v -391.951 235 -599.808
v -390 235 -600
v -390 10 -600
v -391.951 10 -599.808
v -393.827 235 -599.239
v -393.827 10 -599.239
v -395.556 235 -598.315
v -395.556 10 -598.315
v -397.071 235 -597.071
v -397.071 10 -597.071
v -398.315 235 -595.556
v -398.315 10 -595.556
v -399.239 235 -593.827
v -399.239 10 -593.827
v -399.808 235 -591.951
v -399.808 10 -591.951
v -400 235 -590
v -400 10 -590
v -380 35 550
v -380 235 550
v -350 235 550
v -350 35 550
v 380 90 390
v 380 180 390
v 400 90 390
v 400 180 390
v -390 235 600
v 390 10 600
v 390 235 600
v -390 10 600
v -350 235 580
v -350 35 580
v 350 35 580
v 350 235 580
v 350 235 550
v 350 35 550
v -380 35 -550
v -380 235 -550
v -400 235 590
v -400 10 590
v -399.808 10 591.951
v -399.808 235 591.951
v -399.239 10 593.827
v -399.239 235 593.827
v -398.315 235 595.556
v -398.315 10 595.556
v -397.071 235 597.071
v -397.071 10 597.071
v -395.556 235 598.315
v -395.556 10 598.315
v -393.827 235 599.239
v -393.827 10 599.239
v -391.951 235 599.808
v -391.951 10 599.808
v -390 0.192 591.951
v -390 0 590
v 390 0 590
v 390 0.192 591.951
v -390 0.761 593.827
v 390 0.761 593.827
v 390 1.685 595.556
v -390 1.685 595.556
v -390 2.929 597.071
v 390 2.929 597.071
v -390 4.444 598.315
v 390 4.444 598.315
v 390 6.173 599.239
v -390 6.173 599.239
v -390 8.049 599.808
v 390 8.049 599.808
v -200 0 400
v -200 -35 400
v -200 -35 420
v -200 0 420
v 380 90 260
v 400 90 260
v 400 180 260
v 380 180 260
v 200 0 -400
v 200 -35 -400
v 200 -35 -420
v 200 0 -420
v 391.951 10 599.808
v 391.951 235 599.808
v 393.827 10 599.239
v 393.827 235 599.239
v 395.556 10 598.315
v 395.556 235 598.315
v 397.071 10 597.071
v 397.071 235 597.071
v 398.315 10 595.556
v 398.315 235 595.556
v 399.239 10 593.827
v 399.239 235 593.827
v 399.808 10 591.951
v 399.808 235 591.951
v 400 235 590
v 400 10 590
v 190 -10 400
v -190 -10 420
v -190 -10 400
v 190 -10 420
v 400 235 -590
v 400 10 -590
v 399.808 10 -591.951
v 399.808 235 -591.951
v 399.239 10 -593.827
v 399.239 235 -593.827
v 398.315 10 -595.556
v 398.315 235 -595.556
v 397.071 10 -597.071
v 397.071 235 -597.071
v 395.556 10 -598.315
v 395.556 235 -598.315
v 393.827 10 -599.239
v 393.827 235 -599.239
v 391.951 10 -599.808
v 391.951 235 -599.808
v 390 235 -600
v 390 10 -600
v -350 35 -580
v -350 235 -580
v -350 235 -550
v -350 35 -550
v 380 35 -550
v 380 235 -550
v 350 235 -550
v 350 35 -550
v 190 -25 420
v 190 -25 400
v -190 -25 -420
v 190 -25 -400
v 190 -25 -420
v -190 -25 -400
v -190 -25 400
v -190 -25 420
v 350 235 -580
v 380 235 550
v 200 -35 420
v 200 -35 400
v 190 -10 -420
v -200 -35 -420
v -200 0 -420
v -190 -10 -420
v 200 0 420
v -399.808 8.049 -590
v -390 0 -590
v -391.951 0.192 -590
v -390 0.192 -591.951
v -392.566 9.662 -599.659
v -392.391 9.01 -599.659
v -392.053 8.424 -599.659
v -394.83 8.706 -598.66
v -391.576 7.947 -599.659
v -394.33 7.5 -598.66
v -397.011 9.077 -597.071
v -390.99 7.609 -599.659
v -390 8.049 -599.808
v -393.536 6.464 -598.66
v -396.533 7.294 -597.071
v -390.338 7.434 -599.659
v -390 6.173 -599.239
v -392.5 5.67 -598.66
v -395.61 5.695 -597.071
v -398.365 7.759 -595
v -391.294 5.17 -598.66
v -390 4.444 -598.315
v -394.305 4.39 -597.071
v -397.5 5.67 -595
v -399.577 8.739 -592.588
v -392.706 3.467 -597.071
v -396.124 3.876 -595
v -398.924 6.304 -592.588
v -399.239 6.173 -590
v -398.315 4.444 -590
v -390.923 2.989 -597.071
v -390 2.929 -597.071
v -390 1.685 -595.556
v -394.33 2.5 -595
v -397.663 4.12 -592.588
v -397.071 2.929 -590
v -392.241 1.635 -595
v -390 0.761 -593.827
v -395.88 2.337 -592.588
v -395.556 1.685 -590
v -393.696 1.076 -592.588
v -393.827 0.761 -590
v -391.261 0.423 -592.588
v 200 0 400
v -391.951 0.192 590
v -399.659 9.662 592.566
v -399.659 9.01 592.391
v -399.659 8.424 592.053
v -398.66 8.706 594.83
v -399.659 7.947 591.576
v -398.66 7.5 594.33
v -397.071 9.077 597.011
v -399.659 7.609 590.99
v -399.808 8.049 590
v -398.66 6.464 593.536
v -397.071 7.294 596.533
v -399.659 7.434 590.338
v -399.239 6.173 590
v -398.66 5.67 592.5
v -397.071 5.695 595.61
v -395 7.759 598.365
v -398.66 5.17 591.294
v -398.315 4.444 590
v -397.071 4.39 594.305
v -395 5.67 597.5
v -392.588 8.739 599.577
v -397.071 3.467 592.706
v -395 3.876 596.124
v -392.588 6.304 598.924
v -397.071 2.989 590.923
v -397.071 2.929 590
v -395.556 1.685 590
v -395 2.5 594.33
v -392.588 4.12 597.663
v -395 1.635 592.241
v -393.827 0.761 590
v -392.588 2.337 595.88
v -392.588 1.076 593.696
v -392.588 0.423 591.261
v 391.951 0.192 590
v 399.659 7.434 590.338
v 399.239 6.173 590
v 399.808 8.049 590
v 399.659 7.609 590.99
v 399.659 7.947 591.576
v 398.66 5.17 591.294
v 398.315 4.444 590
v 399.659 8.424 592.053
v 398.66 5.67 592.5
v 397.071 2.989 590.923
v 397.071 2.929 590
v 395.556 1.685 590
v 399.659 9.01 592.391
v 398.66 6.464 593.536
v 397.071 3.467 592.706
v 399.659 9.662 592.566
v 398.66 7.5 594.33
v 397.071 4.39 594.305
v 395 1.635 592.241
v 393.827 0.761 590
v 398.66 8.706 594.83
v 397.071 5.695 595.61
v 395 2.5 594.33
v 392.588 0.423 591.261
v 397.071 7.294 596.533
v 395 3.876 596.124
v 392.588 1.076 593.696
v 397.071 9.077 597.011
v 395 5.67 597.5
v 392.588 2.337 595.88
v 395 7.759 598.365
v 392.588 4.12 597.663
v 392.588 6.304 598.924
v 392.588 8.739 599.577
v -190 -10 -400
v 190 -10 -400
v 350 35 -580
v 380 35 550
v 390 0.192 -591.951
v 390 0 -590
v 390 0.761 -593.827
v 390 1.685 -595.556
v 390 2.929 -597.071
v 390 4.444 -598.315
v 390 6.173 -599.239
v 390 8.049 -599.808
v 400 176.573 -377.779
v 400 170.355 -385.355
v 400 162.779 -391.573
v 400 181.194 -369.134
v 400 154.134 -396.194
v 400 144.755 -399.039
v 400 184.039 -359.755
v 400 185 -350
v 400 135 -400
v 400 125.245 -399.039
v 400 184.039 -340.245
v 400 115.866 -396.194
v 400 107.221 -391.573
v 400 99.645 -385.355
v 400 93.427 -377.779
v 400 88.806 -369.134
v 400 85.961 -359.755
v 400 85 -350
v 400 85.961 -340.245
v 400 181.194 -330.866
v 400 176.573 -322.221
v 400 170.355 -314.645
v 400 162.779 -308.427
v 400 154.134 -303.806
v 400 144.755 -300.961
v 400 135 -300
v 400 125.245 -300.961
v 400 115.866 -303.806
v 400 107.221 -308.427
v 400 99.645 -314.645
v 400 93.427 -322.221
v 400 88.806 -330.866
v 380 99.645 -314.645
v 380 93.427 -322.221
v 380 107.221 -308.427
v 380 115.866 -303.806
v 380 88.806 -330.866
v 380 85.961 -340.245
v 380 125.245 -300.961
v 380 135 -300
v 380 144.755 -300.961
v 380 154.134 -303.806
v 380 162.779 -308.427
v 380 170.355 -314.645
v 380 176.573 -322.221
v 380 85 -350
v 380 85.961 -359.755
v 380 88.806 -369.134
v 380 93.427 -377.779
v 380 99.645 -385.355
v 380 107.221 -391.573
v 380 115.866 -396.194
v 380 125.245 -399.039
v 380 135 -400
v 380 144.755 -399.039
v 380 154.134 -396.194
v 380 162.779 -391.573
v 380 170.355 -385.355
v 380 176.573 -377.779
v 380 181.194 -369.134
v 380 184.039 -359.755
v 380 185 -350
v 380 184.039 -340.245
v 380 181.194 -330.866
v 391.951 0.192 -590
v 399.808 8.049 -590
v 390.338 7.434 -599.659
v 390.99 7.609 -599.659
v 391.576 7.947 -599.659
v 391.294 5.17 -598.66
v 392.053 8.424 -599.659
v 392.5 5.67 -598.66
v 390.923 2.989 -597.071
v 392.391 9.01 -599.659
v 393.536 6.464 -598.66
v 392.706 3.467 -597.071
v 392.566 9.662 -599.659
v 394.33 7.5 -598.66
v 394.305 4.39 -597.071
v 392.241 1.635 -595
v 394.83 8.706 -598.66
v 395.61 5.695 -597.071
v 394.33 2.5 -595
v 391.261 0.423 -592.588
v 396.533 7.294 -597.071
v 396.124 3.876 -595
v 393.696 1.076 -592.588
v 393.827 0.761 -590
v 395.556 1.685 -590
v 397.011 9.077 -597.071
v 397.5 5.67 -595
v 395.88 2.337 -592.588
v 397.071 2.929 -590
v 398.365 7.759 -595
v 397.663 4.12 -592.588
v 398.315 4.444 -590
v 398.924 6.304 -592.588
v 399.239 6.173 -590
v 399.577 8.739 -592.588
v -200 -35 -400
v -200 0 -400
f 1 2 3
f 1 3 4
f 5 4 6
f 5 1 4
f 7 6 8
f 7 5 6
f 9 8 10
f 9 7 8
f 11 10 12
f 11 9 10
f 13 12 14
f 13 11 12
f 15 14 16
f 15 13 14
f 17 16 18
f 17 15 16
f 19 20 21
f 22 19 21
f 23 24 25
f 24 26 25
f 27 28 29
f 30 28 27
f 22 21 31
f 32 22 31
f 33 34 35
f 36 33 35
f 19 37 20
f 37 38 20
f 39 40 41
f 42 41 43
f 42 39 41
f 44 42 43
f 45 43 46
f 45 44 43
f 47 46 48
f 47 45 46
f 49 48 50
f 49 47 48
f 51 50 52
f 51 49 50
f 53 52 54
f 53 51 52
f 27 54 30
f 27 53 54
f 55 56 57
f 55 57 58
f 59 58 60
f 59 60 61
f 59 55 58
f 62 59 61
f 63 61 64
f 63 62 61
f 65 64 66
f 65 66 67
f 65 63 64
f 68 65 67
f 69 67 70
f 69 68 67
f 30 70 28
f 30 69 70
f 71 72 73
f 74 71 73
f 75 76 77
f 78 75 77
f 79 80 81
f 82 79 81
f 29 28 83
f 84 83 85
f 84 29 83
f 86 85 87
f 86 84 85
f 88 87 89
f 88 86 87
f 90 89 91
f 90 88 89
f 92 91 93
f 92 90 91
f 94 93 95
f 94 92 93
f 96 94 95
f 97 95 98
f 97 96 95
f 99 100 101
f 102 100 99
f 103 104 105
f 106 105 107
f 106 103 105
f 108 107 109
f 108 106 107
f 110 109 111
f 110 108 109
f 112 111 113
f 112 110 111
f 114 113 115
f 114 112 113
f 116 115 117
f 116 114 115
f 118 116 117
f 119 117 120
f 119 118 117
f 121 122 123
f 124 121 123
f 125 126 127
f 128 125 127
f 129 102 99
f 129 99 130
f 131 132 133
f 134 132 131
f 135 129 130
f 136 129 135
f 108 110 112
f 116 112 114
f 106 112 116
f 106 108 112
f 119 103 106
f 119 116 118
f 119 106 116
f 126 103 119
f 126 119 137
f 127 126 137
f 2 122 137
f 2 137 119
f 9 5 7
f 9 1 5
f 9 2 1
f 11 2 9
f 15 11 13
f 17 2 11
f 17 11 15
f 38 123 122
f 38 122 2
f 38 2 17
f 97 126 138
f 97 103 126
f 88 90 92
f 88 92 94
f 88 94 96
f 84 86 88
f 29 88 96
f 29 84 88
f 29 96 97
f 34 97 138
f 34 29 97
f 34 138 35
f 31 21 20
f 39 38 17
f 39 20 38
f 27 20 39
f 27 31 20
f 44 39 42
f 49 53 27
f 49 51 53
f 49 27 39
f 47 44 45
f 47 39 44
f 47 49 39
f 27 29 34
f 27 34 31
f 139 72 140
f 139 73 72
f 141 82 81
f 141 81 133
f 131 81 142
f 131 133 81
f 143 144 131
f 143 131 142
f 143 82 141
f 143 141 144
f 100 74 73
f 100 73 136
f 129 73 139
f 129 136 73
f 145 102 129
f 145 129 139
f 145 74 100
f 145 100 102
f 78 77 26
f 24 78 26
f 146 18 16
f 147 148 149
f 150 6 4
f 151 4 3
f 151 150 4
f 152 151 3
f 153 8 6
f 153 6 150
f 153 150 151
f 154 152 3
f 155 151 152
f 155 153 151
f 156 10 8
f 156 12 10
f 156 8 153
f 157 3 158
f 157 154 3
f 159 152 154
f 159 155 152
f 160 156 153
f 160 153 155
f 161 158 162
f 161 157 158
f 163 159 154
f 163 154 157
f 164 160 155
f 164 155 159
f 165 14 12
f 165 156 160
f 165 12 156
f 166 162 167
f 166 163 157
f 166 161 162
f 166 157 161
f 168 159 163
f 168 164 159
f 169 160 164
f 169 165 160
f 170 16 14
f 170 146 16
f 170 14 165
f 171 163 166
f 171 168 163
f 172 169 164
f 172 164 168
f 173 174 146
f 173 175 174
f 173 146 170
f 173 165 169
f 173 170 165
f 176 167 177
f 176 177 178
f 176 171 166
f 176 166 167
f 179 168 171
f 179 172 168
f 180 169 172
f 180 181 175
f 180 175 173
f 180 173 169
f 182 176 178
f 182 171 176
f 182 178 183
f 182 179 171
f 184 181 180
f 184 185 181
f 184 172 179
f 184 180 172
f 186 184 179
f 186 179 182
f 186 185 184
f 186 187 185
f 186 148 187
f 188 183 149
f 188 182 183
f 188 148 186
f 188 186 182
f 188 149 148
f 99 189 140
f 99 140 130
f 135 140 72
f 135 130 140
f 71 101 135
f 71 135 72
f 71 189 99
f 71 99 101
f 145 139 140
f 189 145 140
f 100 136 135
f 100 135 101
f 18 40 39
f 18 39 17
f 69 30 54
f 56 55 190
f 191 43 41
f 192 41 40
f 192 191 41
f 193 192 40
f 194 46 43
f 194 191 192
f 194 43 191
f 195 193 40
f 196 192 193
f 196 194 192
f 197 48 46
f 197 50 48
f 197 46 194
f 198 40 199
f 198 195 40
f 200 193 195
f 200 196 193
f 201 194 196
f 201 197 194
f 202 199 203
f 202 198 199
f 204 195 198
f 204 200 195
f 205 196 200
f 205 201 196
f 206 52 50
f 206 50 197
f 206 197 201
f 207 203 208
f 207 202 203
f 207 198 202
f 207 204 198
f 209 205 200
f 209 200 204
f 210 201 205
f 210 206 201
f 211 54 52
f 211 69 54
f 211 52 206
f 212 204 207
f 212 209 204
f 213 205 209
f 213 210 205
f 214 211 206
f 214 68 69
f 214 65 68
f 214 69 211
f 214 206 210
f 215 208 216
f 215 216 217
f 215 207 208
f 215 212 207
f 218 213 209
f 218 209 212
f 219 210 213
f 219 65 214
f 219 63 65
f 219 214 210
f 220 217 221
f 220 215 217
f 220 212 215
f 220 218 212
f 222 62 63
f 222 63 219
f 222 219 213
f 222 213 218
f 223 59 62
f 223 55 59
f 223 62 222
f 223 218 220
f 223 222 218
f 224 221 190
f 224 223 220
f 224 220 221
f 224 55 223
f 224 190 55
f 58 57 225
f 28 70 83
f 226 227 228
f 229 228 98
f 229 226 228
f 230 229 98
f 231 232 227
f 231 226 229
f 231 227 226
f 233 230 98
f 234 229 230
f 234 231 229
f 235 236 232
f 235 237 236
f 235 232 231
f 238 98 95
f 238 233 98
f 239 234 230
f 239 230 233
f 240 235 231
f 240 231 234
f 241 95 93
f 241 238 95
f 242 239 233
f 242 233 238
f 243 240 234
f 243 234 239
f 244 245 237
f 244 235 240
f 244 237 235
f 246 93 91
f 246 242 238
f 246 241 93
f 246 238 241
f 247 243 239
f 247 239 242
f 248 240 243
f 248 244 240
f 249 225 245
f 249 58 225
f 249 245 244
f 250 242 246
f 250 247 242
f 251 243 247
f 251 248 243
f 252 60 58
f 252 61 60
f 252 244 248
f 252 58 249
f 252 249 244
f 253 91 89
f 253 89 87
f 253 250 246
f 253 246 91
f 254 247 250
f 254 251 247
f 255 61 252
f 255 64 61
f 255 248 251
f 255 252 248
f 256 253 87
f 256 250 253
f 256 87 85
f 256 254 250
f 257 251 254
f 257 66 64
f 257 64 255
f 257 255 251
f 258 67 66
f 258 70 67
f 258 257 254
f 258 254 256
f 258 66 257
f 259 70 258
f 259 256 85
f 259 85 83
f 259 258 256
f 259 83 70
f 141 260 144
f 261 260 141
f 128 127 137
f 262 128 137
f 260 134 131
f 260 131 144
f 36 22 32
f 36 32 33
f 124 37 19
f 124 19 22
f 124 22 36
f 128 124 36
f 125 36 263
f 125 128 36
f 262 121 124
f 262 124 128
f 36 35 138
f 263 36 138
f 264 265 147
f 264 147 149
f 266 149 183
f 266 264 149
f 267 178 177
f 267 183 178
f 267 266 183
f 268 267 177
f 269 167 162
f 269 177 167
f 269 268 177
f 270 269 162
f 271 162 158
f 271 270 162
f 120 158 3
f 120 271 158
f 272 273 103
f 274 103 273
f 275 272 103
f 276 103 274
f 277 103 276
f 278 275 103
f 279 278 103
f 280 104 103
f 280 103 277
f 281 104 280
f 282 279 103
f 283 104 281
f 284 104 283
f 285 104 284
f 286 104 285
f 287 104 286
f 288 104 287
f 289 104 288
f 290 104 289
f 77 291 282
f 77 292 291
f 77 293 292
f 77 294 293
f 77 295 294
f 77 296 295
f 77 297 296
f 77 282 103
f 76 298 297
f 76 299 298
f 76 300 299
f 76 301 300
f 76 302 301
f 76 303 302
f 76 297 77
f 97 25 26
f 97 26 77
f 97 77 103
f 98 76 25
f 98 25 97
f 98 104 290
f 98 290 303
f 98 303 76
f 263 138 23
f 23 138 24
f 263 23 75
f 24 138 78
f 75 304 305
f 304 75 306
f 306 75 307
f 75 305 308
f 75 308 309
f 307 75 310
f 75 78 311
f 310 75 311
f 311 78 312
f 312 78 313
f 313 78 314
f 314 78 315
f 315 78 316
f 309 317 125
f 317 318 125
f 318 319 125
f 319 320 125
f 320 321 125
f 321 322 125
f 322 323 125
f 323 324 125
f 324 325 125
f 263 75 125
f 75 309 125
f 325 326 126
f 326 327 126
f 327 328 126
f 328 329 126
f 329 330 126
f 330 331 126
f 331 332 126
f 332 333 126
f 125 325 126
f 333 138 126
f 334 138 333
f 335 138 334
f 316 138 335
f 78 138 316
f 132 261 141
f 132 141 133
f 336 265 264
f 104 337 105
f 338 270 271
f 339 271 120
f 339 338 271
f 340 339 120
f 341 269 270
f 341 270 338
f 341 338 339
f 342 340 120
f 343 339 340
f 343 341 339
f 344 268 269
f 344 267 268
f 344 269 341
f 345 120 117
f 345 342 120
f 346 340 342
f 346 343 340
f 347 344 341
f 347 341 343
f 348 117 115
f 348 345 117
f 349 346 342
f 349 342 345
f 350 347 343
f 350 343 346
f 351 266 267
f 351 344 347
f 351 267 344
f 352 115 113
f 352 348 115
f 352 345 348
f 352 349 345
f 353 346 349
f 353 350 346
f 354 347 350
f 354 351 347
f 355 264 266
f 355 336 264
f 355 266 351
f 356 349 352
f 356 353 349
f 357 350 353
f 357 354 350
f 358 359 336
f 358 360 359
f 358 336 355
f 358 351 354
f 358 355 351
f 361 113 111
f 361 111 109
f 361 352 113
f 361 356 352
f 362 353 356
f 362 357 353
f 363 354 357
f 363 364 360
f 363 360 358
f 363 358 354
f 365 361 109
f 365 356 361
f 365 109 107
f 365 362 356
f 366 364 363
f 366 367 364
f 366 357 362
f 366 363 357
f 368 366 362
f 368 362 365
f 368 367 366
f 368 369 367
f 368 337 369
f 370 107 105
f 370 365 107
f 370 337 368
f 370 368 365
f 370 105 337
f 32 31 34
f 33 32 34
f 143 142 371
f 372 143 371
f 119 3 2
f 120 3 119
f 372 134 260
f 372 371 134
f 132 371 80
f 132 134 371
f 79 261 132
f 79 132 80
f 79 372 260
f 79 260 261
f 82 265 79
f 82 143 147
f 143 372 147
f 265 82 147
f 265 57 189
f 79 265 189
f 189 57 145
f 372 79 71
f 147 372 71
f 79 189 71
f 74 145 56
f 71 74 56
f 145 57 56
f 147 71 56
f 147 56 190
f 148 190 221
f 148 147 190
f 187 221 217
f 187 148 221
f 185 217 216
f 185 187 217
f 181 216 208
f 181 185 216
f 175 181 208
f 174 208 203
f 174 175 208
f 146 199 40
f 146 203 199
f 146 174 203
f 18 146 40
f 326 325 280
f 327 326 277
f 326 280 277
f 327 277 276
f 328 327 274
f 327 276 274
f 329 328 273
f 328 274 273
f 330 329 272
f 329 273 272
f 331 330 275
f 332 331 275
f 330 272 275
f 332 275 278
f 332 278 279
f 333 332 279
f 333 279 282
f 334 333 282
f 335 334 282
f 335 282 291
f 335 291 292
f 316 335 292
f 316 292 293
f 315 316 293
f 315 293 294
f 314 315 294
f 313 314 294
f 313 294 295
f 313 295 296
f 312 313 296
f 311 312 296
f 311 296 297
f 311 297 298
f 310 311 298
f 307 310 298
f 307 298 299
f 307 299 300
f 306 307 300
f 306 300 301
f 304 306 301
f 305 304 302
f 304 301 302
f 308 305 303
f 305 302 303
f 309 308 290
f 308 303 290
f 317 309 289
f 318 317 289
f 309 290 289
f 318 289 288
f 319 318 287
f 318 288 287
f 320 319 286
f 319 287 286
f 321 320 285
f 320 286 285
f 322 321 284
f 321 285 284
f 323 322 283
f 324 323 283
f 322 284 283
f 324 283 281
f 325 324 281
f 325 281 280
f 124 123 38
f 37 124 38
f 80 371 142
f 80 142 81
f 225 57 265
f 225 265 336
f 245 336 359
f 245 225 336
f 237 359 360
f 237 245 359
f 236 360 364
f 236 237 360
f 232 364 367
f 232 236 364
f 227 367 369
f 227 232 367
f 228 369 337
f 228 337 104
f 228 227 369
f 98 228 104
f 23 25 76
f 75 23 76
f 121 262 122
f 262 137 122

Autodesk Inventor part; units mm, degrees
ref_plane "YZ Plane" through (0, 0, 0) normal (1, 0, 0) x (0, 1, 0)
ref_plane "XZ Plane" through (0, 0, 0) normal (0, 1, 0) x (-1, 0, 0)
ref_plane "XY Plane" through (0, 0, 0) normal (0, 0, 1) x (1, 0, 0)
sketch "Sketch1" plane through (0, 0, 0) normal (0, 1, 0) x (-1, 0, 0)
  line L0 (-400, 600) -> (400, 600)
  line L1 (400, 600) -> (400, -600)
  line L2 (400, -600) -> (-400, -600)
  line L3 (-400, -600) -> (-400, 600)
  line L4 (-400, 600) -> (400, -600) construction
  line L5 (400, 600) -> (-400, -600) construction
  point P0 (0, 0)
  dimension "d0" = 800
  dimension "d1" = 1200
extrude "Extrusion1" add sketch "Sketch1" along normal blind 235
sketch "Sketch2" plane through (0, 0, 0) normal (0, -1, 0) x (1, 0, 0)
  line L0 (200, 400) -> (-200, 400)
  line L1 (-200, 400) -> (-200, 420)
  line L2 (-200, 420) -> (200, 420)
  line L3 (200, 420) -> (200, 400)
  line L4 (200, 400) -> (-200, 420) construction
  line L5 (-200, 400) -> (200, 420) construction
  line L6 (200, -420) -> (-200, -420)
  line L7 (-200, -420) -> (-200, -400)
  line L8 (-200, -400) -> (200, -400)
  line L9 (200, -400) -> (200, -420)
  line L10 (200, -420) -> (-200, -400) construction
  line L11 (-200, -420) -> (200, -400) construction
  line L12 (400, -600) -> (-400, -600) projected
  line L13 (400, 600) -> (400, -600) projected
  point P0 (0, 0)
  point P1 (0, 410)
  point P2 (0, -410)
  dimension "d4" = 400
  dimension "d5" = 20
  dimension "d6" = 400
  dimension "d7" = 20
  dimension "d9" = 800
  dimension "d10" = 180
  dimension "d11" = 200
  dimension "d12" = 200
extrude "Extrusion2" add sketch "Sketch2" along normal blind 35
sketch "Sketch3" plane through (-200, 0, 420) normal (0, 0, 1) x (1, 0, 0)
  line L0 (10, -10) -> (390, -10)
  line L1 (390, -10) -> (390, -25)
  line L2 (390, -25) -> (10, -25)
  line L3 (10, -25) -> (10, -10)
  line L4 (10, -10) -> (390, -25) construction
  line L5 (390, -10) -> (10, -25) construction
  line L6 (400, -35) -> (0, -35) projected
  line L7 (400, 0) -> (400, -35) projected
  point P0 (200, 0)
  point P1 (200, -17.5)
  dimension "d15" = 380
  dimension "d16" = 15
  dimension "d17" = 10
  dimension "d18" = 10
extrude "Extrusion3" cut sketch "Sketch3" against normal blind 1000
fillet "Fillet1" radius 10 8 edges at (0, 0, 600) (400, 0, 0) (400, 117.5, 600) (-400, 117.5, 600) (-400, 0, 0) (-400, 117.5, -600) (0, 0, -600) (400, 117.5, -600)
sketch "Sketch8" plane through (400, 10, 590) normal (1, 0, 0) x (0, 0, -1)
  line L0 (940, 225) -> (940, 25) construction
  circle A0 centre (940, 125) radius 50
  line L1 (0, 225) -> (1180, 225) projected
  line L2 (0, -10) -> (1180, -10) projected
  line L3 (1190, 0) -> (1190, 225) projected
  line L4 (200, 80) -> (330, 80)
  line L5 (330, 80) -> (330, 170)
  line L6 (330, 170) -> (200, 170)
  line L7 (200, 170) -> (200, 80)
  line L8 (200, 80) -> (330, 170) construction
  line L9 (330, 80) -> (200, 170) construction
  line L10 (940, 125) -> (0, 125) construction
  line L11 (0, 0) -> (0, 225) projected
  point P0 (590, -10)
  point P1 (265, 125)
  point P2 (265, 125)
  dimension "d39" = 100
  dimension "d40" = 35
  dimension "d41" = 250
  dimension "d44" = 130
  dimension "d45" = 90
  dimension "d46" = 200
extrude "Extrusion7" cut sketch "Sketch8" against normal blind 50
sketch "Sketch9" plane through (0, 235, 0) normal (0, 1, 0) x (1, 0, 0)
  line L0 (-380, -550) -> (380, -550)
  line L1 (380, -550) -> (380, 550)
  line L2 (380, 550) -> (-380, 550)
  line L3 (-380, 550) -> (-380, -550)
  line L4 (-380, -550) -> (380, 550) construction
  line L5 (380, -550) -> (-380, 550) construction
  line L6 (400, -590) -> (400, 590) projected
  line L7 (390, 600) -> (-390, 600) projected
  line L8 (-350, -580) -> (350, -580)
  line L9 (350, -580) -> (350, 580)
  line L10 (350, 580) -> (-350, 580)
  line L11 (-350, 580) -> (-350, -580)
  line L12 (-350, -580) -> (350, 580) construction
  line L13 (350, -580) -> (-350, 580) construction
  point P0 (0, 0)
  point P1 (-350, -550)
  point P2 (350, -550)
  point P3 (350, 550)
  point P4 (-350, 550)
  dimension "d47" = 20
  dimension "d48" = 50
  dimension "d49" = 50
  dimension "d50" = 20
extrude "Extrusion8" cut sketch "Sketch9" against normal blind 200
properties part number "señales_carcasa_x10"
